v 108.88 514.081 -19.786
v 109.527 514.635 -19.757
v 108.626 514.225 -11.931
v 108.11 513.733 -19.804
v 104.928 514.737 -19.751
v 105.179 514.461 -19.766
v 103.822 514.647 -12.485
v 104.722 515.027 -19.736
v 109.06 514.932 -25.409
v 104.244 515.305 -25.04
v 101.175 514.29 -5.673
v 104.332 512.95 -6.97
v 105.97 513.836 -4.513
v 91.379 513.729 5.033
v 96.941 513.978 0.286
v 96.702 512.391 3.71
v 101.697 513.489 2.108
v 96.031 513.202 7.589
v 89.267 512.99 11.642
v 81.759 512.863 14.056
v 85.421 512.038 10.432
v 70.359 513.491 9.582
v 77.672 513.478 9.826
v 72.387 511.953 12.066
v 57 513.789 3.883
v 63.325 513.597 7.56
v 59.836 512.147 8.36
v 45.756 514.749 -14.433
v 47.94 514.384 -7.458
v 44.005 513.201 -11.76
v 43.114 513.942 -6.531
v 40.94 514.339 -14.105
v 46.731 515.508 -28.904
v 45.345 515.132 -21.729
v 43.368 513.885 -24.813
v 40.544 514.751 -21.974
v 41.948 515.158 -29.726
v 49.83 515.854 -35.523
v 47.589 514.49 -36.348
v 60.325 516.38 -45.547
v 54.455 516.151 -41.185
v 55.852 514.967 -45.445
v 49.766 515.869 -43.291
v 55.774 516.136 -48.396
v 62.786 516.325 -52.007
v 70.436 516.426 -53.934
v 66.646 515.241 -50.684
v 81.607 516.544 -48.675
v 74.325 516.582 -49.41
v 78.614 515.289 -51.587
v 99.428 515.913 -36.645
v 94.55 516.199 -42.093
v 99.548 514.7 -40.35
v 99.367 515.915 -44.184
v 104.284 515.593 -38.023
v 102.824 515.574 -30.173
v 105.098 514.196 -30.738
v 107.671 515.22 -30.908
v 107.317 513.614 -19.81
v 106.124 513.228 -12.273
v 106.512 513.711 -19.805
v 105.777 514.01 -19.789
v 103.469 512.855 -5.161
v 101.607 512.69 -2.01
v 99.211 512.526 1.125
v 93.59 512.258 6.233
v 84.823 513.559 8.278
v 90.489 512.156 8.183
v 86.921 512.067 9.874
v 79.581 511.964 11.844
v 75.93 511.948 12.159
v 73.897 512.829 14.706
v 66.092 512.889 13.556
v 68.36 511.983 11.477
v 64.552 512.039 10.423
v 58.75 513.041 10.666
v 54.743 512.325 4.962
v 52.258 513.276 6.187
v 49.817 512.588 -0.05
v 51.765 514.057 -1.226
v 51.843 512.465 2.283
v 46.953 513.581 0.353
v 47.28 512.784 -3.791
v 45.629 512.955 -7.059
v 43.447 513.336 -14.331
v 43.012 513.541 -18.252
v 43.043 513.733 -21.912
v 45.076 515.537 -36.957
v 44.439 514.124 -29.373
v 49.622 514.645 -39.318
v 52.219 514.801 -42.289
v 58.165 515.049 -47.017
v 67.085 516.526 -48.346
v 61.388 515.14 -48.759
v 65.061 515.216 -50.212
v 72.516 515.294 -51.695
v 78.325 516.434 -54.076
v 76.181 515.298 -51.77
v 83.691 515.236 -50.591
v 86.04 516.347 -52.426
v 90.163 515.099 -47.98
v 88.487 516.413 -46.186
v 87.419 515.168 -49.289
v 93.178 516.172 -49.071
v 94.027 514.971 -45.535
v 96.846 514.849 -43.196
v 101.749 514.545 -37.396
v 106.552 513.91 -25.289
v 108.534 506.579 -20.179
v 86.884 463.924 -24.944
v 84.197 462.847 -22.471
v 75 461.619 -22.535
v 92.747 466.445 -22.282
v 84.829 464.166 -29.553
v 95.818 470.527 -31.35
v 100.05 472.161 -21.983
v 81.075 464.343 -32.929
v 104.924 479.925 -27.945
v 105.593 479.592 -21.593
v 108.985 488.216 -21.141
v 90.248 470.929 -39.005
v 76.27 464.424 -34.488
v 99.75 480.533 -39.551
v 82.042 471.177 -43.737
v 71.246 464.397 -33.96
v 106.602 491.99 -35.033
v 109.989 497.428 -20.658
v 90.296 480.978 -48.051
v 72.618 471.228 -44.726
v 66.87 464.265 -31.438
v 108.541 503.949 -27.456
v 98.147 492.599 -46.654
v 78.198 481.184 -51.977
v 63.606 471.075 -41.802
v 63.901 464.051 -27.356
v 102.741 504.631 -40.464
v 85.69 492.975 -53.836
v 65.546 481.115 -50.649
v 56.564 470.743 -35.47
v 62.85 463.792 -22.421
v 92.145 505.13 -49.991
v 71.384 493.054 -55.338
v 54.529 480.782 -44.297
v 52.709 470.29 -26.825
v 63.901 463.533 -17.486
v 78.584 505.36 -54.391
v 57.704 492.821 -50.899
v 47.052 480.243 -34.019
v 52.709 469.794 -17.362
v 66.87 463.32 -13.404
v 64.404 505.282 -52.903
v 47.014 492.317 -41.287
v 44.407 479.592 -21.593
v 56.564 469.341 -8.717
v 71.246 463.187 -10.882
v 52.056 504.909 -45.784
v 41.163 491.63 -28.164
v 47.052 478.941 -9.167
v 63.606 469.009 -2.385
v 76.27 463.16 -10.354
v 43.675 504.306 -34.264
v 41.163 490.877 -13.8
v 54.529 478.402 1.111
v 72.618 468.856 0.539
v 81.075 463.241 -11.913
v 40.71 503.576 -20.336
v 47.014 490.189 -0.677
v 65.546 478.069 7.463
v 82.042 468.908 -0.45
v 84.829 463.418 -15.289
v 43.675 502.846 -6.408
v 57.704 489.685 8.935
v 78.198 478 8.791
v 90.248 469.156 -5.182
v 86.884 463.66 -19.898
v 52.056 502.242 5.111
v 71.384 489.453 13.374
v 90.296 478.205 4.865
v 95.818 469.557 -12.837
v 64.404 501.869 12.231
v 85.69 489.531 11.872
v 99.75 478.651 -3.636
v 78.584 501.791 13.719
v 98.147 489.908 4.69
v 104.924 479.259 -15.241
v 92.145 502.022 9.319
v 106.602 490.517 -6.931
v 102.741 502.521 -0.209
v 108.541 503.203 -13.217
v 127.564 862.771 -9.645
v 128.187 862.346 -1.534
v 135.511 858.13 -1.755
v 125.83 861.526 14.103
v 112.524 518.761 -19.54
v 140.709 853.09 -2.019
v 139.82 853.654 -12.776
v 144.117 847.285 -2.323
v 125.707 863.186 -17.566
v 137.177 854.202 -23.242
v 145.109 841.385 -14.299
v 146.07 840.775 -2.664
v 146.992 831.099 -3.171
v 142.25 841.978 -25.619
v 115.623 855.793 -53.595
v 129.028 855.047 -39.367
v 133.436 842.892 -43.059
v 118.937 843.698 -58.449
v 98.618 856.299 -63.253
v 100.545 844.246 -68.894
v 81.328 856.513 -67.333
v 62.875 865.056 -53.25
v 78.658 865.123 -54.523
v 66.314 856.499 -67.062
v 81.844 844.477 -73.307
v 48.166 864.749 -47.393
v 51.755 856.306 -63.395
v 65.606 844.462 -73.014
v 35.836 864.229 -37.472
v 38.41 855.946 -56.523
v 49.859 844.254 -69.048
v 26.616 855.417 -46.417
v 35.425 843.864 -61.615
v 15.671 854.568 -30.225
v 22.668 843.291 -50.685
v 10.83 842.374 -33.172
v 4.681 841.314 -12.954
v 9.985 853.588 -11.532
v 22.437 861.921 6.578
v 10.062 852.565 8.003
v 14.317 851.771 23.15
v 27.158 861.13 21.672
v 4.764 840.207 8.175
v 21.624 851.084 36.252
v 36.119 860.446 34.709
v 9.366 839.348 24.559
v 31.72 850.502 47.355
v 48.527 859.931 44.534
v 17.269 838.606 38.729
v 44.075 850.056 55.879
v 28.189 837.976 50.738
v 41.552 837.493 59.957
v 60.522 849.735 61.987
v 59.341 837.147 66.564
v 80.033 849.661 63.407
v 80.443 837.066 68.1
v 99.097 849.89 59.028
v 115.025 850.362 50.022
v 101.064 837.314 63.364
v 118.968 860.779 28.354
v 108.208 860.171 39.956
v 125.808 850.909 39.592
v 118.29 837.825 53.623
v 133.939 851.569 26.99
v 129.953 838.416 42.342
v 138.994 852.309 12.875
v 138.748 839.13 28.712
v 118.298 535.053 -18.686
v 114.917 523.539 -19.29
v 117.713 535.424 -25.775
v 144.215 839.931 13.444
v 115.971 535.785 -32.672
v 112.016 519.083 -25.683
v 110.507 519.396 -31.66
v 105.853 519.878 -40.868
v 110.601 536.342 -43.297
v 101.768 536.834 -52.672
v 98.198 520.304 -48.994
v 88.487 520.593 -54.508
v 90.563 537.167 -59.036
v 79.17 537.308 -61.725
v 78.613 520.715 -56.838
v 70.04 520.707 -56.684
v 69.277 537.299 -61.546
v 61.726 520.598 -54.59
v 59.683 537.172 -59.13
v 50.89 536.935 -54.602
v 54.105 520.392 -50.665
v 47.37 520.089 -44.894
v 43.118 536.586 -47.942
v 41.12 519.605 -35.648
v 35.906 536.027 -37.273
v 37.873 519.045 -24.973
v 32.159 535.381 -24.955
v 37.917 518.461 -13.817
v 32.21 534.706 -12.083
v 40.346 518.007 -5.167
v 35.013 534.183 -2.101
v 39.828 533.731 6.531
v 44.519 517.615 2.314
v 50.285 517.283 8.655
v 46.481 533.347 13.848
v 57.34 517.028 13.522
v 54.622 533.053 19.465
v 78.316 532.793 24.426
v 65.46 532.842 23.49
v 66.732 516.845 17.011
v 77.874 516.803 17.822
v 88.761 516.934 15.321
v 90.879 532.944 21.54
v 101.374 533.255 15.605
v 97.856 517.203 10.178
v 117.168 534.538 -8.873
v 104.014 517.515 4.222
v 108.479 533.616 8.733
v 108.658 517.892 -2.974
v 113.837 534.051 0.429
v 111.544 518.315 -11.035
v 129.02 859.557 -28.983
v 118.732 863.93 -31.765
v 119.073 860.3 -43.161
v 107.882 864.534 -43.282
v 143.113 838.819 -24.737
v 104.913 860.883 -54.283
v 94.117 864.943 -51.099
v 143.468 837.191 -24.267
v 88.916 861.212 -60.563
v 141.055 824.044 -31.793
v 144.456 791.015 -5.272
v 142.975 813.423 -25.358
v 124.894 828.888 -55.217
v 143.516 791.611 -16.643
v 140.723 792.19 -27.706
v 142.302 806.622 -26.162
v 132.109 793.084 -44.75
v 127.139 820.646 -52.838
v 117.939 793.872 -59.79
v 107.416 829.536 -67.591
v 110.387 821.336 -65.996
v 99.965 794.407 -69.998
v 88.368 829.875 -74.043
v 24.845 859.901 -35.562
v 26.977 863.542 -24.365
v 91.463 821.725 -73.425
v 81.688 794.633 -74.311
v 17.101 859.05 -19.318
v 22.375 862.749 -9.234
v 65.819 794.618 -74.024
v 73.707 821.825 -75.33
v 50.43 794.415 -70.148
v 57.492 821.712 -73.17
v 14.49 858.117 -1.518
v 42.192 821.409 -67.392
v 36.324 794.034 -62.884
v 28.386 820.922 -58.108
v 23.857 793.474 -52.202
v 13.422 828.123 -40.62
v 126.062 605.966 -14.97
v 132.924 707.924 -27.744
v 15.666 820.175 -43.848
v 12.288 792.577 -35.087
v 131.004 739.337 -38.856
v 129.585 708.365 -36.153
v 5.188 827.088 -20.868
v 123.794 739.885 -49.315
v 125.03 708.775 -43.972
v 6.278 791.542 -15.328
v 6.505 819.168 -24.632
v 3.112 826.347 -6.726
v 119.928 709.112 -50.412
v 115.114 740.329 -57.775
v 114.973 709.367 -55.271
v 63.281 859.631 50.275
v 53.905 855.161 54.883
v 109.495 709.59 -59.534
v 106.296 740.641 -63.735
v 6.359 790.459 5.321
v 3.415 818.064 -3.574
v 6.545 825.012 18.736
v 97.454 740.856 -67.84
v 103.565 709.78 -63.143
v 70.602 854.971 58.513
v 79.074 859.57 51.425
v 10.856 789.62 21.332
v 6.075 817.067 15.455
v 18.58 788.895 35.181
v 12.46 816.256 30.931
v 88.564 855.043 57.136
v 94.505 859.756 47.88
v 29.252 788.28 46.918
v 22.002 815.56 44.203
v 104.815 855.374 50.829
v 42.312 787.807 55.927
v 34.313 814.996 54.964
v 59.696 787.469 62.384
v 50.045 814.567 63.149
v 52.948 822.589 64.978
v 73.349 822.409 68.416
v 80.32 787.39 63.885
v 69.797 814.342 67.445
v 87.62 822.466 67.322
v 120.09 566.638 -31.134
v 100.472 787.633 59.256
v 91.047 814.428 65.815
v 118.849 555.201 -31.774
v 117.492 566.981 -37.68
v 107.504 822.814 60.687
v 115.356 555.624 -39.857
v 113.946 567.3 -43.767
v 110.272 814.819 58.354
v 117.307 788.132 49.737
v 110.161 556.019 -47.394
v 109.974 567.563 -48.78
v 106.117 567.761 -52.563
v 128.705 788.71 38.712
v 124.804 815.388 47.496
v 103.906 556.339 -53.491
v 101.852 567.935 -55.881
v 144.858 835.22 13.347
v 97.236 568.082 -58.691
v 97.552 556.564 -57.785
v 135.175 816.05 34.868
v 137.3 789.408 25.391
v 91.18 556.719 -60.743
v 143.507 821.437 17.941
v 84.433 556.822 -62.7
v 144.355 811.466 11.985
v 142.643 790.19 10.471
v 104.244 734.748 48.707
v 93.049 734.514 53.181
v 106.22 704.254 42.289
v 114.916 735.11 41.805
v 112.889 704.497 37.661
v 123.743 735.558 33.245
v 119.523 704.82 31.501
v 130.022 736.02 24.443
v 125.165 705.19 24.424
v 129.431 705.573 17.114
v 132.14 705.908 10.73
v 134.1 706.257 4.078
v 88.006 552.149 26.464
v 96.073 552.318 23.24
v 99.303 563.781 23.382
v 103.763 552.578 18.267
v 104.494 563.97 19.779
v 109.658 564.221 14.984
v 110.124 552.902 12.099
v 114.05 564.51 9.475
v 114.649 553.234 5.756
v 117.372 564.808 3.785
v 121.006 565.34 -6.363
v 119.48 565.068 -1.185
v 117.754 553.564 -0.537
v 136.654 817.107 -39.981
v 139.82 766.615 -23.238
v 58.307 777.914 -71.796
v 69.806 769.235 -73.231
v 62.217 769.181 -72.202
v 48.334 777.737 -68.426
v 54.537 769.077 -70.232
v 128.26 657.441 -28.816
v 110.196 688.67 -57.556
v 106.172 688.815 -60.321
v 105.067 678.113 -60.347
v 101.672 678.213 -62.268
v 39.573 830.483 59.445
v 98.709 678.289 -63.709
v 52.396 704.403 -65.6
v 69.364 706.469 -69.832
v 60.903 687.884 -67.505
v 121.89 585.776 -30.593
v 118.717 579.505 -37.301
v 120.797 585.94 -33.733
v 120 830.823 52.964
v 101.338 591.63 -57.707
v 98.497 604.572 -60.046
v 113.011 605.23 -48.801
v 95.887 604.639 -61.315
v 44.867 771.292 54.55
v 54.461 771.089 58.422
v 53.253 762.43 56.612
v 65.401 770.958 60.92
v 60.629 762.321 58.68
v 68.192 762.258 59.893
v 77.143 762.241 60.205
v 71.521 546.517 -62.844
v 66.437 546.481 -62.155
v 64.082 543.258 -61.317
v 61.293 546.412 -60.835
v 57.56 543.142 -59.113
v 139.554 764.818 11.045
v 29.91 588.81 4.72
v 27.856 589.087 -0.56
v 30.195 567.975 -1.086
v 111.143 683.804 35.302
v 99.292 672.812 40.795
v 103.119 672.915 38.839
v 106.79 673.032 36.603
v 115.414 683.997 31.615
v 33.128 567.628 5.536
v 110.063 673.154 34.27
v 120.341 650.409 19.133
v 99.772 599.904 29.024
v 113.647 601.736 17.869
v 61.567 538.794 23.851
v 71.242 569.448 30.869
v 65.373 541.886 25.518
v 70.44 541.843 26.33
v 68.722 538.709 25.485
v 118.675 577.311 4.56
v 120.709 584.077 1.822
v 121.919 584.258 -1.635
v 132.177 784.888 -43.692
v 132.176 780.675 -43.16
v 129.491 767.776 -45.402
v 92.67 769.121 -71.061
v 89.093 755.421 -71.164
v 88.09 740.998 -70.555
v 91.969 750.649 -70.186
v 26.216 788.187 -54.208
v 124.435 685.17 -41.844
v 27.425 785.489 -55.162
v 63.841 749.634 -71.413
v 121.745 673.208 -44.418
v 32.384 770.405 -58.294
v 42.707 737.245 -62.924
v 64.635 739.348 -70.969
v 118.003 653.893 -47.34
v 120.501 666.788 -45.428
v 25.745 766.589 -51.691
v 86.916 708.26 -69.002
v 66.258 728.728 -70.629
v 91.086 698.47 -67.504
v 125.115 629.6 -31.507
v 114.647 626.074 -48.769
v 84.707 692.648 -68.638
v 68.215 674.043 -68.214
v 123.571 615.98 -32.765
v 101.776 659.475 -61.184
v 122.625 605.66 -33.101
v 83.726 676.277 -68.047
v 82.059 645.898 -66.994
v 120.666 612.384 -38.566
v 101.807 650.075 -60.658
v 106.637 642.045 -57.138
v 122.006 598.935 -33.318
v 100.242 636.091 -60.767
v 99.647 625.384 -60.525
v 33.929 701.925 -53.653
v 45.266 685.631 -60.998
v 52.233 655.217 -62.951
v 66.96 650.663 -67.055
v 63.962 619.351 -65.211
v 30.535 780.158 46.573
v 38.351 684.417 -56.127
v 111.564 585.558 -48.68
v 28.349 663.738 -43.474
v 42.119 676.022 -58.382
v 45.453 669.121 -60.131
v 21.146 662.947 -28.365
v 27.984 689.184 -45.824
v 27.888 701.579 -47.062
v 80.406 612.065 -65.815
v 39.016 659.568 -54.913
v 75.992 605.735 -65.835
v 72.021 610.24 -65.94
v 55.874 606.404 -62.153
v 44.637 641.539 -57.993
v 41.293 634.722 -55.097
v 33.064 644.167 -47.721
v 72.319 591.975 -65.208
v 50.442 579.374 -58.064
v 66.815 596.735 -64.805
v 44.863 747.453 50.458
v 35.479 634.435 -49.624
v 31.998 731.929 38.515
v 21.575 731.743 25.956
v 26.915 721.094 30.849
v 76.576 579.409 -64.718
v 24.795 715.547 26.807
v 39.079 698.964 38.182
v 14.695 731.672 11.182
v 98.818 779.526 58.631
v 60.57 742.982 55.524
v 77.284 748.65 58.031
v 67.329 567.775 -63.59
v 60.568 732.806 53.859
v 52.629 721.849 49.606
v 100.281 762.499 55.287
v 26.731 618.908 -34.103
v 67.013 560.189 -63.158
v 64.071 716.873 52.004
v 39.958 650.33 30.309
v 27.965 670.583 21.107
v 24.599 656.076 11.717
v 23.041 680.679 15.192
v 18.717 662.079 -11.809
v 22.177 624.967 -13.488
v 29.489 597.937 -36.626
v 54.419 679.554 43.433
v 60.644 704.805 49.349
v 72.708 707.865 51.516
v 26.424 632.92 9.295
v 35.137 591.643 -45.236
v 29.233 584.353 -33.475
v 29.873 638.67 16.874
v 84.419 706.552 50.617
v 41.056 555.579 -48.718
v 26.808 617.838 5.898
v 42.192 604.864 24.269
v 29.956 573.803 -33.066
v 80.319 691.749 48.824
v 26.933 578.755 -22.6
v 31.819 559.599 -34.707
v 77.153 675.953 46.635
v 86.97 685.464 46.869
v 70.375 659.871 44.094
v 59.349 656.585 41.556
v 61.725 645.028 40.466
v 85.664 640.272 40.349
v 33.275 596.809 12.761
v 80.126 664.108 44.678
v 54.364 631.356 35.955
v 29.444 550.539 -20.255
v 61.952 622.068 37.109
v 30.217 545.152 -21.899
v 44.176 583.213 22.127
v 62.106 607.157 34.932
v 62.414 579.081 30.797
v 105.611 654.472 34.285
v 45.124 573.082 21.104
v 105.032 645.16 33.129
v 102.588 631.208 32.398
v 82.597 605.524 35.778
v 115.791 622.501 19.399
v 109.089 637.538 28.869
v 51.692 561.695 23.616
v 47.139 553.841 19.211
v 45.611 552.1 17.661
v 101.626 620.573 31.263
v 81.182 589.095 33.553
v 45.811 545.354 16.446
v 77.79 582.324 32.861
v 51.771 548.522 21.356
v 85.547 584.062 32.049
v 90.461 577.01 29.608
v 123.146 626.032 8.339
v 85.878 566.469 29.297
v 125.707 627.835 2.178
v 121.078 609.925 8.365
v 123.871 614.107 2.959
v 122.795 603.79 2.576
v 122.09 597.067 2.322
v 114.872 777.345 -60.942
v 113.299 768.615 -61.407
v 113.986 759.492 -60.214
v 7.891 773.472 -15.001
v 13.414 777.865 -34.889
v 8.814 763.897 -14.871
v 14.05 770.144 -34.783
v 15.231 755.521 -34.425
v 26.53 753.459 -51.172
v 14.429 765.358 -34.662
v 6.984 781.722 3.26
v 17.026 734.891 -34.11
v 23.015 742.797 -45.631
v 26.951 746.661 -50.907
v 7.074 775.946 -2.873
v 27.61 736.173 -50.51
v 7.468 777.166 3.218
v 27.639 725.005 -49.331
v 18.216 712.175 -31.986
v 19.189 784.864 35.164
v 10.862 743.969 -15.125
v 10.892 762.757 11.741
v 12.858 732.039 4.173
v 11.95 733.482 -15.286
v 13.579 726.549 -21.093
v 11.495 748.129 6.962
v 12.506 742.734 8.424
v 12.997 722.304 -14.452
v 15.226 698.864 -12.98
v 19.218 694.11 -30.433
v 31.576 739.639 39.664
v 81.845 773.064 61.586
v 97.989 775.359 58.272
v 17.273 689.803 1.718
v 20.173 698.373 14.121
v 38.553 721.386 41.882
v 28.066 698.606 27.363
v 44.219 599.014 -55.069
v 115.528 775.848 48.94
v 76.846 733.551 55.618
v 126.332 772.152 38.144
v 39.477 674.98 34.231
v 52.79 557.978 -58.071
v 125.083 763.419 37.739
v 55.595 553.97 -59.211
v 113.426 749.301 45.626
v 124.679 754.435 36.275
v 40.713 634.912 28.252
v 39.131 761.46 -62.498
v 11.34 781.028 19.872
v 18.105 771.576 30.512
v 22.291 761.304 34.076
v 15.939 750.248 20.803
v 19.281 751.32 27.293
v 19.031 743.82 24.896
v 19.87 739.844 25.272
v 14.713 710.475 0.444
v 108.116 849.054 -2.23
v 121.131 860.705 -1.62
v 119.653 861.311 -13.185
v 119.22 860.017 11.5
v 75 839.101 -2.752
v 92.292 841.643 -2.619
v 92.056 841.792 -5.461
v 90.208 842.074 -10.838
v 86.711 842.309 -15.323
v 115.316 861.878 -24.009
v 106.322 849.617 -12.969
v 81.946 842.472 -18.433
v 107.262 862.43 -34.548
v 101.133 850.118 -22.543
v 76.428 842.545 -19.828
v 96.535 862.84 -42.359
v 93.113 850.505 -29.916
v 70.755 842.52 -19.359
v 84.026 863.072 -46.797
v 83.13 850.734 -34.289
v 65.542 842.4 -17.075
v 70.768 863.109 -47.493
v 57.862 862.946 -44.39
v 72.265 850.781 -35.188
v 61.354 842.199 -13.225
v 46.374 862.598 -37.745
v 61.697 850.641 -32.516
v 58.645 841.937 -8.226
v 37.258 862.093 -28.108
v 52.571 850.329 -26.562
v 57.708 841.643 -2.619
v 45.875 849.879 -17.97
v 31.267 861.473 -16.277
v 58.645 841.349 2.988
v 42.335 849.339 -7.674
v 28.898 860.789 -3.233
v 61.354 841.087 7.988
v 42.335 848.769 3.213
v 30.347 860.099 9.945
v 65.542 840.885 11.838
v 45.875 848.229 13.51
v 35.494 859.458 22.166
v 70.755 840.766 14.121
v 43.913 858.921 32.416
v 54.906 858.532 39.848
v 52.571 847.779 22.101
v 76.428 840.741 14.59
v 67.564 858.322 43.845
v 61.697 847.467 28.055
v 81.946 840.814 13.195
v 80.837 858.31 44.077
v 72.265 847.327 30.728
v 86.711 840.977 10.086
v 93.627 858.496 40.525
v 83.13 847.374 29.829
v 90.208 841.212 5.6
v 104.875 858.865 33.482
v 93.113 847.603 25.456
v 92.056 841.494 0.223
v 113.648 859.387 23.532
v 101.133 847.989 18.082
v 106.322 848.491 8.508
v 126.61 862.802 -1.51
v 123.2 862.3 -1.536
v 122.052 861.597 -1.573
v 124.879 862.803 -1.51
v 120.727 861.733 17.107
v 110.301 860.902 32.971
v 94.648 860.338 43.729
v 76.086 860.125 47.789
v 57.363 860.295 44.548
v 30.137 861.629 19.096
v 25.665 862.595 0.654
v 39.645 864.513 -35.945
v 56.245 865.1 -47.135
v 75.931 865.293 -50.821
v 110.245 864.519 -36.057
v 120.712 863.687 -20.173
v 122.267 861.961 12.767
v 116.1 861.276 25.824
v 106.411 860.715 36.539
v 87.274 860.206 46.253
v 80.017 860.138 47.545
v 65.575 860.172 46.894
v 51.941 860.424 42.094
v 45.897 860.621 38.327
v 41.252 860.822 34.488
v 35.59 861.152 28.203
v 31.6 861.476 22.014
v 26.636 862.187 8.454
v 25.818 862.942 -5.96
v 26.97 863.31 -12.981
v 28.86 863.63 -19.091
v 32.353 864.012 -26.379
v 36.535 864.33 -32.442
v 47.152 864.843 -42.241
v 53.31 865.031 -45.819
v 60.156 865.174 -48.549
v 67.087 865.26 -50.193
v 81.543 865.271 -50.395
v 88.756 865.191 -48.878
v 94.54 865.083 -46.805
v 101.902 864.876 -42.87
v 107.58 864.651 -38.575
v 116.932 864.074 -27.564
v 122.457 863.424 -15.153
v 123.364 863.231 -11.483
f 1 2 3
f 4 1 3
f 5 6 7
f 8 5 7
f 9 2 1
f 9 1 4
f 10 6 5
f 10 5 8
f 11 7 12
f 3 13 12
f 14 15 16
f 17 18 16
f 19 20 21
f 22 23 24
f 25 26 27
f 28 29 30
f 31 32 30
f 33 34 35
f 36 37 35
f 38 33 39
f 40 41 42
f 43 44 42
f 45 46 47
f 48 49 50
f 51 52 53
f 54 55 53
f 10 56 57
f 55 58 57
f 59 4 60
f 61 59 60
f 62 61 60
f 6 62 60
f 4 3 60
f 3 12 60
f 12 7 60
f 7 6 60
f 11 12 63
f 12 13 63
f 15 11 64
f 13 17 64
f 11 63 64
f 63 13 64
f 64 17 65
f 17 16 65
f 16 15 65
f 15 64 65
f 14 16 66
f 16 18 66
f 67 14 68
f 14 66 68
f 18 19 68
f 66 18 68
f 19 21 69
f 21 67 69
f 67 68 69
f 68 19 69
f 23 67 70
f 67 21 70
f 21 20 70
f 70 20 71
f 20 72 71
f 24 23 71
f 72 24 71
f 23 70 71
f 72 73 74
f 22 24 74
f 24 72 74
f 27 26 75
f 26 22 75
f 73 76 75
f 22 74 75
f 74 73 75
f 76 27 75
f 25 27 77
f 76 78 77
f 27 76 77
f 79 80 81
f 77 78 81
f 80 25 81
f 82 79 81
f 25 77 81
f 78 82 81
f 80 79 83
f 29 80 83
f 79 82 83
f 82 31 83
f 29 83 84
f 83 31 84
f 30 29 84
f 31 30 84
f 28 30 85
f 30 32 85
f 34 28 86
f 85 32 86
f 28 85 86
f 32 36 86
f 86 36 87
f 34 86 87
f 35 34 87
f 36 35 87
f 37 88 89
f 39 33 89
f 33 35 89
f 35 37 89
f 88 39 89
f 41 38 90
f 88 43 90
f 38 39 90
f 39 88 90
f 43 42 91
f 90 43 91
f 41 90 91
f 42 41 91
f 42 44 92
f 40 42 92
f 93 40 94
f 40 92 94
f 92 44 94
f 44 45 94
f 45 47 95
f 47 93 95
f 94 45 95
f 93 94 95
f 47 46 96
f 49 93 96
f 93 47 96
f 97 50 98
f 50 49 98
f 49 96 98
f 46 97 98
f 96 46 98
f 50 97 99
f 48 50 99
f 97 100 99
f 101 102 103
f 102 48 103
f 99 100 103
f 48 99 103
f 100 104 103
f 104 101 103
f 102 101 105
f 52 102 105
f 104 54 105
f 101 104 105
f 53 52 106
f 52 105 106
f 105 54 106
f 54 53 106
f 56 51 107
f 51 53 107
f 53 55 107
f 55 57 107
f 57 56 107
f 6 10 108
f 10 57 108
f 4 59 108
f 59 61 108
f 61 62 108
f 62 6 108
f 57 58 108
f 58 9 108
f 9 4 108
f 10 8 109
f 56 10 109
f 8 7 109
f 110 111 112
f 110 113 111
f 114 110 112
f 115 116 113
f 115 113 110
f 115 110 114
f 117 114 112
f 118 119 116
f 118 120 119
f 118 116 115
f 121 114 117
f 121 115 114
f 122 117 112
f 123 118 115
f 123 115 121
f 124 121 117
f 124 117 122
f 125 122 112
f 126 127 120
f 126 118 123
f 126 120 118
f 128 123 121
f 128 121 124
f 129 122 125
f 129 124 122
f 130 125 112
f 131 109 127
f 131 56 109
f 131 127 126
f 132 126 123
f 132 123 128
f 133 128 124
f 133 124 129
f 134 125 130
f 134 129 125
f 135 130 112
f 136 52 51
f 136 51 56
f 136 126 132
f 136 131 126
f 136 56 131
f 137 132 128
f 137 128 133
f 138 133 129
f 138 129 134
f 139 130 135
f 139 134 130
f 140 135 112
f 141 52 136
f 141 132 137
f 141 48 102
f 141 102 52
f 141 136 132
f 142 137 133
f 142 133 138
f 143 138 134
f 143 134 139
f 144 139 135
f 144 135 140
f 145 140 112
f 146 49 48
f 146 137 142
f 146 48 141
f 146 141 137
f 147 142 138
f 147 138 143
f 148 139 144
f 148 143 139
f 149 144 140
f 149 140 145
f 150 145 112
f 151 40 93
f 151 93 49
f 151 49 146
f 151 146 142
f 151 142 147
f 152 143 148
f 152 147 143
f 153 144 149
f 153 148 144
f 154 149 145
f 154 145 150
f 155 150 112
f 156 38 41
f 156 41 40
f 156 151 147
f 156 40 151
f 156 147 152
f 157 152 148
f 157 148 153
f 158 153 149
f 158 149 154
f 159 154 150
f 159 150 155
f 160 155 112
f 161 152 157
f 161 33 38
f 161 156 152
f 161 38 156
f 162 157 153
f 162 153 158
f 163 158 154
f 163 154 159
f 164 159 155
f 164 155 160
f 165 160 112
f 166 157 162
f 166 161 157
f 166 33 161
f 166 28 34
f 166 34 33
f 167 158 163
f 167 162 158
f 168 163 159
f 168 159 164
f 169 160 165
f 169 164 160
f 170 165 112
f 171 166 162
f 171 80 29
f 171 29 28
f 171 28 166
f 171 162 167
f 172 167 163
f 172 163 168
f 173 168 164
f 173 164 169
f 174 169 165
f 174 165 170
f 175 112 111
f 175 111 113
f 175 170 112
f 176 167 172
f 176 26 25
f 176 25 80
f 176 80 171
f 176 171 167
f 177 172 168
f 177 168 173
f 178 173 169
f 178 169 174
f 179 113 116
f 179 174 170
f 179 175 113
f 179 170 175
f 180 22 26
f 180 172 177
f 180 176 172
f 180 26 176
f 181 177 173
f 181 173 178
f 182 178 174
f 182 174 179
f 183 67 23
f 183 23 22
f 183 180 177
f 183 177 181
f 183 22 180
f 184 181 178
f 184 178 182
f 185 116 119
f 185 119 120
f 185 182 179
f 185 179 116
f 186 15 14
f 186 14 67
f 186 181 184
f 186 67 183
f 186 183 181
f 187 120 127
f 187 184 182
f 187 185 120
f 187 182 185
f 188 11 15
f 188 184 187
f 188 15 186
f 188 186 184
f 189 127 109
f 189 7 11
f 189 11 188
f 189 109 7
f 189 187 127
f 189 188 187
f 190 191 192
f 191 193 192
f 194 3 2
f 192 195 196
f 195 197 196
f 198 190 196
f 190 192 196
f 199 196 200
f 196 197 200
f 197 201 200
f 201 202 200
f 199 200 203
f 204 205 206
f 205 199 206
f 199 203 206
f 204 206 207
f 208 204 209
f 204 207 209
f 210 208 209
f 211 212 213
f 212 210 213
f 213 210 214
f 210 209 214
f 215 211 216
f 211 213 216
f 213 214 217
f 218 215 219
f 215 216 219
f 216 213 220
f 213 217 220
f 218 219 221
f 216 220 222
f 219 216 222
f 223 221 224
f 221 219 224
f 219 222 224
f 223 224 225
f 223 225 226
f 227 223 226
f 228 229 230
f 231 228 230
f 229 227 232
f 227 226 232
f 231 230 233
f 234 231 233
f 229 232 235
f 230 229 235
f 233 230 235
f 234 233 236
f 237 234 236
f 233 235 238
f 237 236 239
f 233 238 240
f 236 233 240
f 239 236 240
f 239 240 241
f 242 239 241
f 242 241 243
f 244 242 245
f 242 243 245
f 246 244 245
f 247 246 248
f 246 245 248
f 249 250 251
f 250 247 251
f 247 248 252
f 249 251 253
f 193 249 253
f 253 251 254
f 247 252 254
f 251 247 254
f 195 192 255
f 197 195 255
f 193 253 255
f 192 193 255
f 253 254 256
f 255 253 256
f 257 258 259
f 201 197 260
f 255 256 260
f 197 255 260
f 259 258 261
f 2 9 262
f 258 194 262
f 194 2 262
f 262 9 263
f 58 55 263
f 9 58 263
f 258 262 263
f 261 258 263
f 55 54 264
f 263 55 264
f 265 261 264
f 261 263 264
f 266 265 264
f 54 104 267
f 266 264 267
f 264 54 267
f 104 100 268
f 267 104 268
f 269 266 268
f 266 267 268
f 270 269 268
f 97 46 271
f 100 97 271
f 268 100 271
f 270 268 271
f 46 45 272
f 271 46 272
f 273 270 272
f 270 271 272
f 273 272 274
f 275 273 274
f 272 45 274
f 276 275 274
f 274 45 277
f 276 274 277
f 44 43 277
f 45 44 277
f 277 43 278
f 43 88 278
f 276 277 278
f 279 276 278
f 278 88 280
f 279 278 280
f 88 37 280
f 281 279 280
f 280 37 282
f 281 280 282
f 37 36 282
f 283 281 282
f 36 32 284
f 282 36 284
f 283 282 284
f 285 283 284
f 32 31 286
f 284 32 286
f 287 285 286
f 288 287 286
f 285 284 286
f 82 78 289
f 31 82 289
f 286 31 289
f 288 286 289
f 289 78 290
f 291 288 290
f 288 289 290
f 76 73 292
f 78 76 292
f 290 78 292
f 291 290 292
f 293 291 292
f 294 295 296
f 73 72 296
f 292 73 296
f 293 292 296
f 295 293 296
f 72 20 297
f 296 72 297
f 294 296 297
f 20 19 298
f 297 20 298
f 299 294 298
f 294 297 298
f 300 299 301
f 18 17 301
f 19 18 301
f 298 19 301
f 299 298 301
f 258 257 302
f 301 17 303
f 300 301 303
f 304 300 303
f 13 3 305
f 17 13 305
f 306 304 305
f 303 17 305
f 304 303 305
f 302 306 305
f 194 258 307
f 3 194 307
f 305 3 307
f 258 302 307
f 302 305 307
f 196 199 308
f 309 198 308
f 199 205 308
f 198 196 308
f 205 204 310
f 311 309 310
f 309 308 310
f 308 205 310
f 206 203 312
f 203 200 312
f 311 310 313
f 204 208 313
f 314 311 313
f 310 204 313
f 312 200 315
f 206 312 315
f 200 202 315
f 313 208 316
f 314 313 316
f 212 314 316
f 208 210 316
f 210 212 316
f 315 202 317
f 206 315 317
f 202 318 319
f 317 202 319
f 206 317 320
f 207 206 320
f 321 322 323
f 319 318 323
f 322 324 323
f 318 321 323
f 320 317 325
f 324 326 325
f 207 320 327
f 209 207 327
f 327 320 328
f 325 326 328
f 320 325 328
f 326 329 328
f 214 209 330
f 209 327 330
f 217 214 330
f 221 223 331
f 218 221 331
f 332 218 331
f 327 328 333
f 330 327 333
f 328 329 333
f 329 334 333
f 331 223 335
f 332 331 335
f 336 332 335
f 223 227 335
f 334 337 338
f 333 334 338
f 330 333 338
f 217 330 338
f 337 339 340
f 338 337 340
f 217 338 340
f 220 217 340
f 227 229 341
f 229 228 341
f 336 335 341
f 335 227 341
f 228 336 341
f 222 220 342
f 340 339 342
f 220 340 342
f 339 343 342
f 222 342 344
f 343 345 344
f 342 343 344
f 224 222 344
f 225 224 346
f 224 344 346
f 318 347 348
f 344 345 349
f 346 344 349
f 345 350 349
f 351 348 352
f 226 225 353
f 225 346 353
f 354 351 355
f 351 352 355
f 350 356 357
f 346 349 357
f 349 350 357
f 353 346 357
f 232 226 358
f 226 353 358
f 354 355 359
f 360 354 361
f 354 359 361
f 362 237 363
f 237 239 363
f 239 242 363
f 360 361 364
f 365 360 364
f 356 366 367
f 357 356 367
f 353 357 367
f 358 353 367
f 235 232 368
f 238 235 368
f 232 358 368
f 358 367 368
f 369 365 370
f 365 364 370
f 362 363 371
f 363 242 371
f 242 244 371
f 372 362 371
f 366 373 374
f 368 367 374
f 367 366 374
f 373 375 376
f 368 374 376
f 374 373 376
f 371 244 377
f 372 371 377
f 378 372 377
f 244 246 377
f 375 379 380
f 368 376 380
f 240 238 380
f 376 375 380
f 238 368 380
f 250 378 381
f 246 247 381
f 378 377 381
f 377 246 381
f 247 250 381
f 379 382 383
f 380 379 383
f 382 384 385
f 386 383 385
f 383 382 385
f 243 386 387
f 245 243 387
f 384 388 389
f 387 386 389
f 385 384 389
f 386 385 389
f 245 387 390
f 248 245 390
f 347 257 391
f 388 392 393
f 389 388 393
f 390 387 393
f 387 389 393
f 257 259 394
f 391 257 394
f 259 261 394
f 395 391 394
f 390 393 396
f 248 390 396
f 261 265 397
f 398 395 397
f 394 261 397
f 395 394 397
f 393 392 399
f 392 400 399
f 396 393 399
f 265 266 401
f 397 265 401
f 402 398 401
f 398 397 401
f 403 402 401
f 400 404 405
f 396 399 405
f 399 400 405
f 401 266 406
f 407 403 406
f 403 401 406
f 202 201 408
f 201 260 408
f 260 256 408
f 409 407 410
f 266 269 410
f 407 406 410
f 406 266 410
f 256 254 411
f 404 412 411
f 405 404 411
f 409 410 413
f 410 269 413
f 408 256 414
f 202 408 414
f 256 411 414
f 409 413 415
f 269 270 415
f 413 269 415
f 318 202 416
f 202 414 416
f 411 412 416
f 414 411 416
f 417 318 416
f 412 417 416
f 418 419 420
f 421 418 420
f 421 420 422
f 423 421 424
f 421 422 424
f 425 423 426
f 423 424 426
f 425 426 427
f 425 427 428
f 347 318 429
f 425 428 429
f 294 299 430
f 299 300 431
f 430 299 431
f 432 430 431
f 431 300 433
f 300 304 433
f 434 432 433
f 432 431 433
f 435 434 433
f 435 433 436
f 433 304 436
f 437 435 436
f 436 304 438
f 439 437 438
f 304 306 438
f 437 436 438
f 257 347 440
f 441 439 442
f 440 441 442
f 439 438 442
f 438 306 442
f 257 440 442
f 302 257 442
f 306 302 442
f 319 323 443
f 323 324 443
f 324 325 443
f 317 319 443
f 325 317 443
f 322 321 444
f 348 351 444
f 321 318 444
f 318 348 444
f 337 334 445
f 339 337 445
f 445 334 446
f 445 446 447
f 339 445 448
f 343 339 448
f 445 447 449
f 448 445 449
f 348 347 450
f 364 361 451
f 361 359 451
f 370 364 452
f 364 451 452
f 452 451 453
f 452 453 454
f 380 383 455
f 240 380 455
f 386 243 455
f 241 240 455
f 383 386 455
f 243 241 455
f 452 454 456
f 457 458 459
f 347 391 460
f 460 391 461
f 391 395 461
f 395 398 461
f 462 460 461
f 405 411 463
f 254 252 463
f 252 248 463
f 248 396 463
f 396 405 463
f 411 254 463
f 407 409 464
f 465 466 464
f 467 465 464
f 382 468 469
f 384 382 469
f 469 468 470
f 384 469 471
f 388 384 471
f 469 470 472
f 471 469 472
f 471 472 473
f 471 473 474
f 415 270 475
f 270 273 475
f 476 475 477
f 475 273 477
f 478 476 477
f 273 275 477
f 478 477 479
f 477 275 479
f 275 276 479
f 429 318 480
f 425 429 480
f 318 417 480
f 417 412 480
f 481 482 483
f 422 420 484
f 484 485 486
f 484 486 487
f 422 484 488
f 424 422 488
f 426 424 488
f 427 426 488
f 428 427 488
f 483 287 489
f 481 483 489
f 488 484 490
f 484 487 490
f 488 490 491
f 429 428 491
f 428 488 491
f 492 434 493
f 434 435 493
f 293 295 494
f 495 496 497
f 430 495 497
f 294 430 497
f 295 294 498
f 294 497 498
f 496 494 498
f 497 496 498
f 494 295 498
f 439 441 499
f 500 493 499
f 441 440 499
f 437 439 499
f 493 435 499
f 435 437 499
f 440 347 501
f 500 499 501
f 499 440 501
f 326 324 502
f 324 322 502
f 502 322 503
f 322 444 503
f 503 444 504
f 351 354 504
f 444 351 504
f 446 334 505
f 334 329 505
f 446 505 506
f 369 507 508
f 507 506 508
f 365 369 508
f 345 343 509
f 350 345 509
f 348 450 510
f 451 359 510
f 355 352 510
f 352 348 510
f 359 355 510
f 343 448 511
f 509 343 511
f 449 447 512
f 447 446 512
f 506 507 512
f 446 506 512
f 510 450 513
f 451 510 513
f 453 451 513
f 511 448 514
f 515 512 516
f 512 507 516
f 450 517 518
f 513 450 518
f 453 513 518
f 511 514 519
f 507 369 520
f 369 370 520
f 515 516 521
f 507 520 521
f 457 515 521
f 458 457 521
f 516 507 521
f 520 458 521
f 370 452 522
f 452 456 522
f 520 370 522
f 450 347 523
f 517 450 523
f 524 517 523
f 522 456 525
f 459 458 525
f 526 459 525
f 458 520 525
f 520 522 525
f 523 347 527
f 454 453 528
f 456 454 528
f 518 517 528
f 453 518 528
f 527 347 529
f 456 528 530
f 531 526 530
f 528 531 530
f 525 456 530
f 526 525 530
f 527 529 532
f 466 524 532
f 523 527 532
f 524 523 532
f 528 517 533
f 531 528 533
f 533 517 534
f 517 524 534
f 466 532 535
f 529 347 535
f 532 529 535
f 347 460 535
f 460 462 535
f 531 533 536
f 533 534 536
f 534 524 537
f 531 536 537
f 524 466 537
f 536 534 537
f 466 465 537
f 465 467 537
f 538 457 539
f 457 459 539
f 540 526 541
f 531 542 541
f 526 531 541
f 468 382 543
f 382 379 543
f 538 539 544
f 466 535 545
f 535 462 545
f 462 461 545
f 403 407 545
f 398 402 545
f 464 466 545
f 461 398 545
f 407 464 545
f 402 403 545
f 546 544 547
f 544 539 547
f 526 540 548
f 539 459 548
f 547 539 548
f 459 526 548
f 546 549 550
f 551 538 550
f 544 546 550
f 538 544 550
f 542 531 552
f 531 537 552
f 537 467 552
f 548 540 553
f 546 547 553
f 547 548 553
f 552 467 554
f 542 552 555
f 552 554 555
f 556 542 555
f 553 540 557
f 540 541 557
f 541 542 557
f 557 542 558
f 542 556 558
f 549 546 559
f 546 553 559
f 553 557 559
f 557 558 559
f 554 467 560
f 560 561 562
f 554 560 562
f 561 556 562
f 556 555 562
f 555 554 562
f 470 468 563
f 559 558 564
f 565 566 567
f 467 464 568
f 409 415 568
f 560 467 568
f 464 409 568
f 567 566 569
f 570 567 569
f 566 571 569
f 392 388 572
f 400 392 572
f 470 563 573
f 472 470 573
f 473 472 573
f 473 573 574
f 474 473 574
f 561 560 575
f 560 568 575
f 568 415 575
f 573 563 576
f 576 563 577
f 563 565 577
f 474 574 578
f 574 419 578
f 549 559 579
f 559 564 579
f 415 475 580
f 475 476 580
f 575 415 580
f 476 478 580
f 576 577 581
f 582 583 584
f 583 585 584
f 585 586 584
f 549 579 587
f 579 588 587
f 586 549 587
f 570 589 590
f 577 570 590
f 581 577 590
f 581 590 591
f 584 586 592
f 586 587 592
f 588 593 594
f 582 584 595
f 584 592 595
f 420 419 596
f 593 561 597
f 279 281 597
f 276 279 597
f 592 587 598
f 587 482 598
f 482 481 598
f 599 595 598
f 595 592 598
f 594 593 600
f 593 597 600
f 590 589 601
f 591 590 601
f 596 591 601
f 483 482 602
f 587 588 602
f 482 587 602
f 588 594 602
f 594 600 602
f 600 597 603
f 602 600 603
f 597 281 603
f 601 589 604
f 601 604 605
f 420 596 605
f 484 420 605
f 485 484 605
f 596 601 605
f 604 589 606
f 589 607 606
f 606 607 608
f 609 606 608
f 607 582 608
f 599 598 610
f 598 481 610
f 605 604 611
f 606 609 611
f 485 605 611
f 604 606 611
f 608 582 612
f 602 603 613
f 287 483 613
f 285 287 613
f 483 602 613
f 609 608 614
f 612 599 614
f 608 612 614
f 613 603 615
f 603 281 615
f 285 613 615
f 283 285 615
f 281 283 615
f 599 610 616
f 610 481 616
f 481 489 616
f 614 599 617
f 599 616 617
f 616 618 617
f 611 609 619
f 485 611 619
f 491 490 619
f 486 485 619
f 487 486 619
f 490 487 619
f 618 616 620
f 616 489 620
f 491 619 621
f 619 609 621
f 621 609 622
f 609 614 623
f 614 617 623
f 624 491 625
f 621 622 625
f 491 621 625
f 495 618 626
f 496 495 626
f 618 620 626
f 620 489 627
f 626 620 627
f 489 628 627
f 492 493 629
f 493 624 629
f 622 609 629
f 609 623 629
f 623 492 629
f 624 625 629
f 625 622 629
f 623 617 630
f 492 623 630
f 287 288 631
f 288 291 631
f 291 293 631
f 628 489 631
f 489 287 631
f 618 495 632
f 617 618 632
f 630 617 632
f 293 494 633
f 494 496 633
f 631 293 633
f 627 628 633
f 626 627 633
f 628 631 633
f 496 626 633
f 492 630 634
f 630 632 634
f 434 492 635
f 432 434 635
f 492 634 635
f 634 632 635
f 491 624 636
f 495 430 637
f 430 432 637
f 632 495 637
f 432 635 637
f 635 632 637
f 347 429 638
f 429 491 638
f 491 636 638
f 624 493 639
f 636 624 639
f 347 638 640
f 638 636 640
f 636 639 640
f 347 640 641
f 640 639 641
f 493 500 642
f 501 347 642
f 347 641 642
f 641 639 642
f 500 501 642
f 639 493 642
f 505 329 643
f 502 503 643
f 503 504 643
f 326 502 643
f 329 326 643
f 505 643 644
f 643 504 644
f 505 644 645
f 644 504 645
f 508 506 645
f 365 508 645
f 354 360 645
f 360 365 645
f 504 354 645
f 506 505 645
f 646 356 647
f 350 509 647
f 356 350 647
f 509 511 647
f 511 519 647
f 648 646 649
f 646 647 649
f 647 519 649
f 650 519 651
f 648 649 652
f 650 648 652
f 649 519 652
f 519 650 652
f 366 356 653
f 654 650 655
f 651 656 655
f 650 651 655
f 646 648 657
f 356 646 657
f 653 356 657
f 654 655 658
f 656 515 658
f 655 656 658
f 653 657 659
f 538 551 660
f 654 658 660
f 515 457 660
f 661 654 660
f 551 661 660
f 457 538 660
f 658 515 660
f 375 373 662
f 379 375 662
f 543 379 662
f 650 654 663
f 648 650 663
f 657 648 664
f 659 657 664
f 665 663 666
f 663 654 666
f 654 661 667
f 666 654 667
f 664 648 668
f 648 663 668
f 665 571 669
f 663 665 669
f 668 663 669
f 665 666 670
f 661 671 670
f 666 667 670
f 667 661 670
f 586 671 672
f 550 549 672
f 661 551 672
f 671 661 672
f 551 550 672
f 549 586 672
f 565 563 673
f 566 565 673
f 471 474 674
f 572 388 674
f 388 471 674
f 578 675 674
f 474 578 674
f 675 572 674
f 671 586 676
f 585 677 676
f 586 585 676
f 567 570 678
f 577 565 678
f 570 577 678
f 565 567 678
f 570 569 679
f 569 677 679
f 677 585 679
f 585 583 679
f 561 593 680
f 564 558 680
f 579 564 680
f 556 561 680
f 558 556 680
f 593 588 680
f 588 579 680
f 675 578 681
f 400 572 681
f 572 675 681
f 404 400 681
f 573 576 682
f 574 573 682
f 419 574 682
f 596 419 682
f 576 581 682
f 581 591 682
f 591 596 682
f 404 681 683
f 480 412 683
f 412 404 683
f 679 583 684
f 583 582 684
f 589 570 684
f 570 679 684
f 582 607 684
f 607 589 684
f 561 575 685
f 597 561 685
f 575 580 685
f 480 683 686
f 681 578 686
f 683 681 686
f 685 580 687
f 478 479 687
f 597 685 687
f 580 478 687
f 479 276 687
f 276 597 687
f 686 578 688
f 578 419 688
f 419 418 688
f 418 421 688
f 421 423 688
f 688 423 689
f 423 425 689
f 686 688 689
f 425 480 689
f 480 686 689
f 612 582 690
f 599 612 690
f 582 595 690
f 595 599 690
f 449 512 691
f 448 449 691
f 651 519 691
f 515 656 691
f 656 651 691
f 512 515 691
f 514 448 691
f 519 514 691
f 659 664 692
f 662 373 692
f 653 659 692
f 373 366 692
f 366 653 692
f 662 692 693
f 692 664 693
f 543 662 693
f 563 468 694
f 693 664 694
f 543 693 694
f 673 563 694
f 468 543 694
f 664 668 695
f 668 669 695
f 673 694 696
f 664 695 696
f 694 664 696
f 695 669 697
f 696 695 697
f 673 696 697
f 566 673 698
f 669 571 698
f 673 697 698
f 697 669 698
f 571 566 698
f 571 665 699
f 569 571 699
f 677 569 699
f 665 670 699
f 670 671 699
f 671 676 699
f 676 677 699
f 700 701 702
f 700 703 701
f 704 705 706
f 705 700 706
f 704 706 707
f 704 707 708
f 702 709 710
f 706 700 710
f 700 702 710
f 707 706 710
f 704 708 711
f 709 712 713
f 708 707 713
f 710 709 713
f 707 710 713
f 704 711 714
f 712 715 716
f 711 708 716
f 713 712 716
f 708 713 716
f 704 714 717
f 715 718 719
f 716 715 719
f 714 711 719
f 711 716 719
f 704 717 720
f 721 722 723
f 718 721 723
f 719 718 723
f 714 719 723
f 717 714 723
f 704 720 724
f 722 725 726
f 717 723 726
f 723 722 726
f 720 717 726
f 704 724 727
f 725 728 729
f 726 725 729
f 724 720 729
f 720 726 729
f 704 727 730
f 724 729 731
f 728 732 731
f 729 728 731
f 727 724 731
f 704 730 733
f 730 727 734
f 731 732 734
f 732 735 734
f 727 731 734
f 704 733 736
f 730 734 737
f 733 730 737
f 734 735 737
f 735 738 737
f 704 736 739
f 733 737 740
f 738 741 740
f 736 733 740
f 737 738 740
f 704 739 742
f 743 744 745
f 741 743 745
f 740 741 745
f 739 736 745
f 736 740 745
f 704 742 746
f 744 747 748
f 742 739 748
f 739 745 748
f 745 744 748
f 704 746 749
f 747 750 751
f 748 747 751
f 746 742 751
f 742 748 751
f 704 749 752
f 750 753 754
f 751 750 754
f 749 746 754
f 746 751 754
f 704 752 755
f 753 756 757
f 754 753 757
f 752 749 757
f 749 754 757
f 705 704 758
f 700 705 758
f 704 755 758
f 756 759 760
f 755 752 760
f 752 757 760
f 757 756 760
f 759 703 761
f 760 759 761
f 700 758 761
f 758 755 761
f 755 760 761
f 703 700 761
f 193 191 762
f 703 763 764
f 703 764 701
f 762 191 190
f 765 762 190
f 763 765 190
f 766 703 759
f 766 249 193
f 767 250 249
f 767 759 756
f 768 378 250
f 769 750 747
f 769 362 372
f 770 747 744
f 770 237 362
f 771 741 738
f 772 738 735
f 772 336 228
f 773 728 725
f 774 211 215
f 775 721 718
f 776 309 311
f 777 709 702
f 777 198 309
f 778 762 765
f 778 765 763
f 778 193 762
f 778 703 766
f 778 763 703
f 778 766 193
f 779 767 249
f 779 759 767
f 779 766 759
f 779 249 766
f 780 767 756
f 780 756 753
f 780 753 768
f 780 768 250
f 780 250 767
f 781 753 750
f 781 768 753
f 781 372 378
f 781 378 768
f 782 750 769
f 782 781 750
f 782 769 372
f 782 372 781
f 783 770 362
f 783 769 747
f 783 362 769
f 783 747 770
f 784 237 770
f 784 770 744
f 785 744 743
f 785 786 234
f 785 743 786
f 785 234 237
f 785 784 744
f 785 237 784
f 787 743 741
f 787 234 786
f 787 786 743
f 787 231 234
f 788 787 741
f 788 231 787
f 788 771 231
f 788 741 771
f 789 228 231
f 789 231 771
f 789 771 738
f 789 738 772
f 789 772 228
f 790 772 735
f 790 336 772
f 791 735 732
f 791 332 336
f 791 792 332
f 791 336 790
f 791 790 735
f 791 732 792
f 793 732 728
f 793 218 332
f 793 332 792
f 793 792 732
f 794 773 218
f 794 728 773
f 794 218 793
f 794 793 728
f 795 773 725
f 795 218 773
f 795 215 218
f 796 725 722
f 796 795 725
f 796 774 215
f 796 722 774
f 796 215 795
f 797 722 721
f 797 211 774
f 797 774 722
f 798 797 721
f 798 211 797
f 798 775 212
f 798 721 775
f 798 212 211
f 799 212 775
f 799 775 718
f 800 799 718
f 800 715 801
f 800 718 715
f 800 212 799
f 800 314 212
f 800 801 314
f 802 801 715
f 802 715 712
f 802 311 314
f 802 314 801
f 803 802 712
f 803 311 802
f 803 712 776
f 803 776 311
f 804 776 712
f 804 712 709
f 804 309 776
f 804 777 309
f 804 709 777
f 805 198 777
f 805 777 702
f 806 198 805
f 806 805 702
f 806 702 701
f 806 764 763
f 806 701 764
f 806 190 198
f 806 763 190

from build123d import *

# Parameters (mm, degrees)
FILLET096_R             = 6
FILLET097_R             = 3
BODY058_PLACEMENT_ANGLE = 3


with BuildPart() as part:
    # Sketch195 → Revolution100 (revolve)
    with BuildSketch(Plane.XY):
        with BuildLine():
            Line((0, -29.245996), (0, -395.969613))
            add(Edge.make_bspline(
                [(0, -29.245996), (71.97521, -29.245996), (74.761139, -71.14093), (60.18763, -188.319479), (45.659971, -358.12794), (39.993144, -395.969613), (0, -395.969613)],
                knots=[0, 0, 0, 0, 0.25, 0.5, 0.75, 1, 1, 1, 1], degree=3))
        make_face()
    revolve(axis=Axis((0, 0, 0), (0, 1, 0)))

    # Sketch196 → Groove094 (revolve, cut)
    with BuildSketch(Plane.XY):
        with BuildLine():
            Line((0, 60), (0, -60))
            ThreePointArc((0, -60), (60, 0), (0, 60))
        make_face()
    revolve(axis=Axis((0, 0, 0), (0, 1, 0)), mode=Mode.SUBTRACT)

    # Fillet096
    fillet096_edges = [part.edges().sort_by_distance(p)[0] for p in [
        (-48.746872, -34.982031, 0),
    ]]
    fillet(fillet096_edges, radius=FILLET096_R)

    # Sketch197 → Groove095 (revolve, cut)
    with BuildSketch(Plane.XY):
        with BuildLine():
            Line((0, -368), (0, -438))
            ThreePointArc((0, -438), (35, -403), (0, -368))
        make_face()
    revolve(axis=Axis((0, 0, 0), (0, 1, 0)), mode=Mode.SUBTRACT)

    # Fillet097
    fillet097_edges = [part.edges().sort_by_distance(p)[0] for p in [
        (-31.536984, -387.820454, 0),
    ]]
    fillet(fillet097_edges, radius=FILLET097_R)

    # Sketch197 → Revolution101 (revolve)
    with BuildSketch(Plane.XY):
        with BuildLine():
            Line((0, -368), (0, -438))
            ThreePointArc((0, -438), (35, -403), (0, -368))
        make_face()
    revolve(axis=Axis((0, 0, 0), (0, 1, 0)))


with BuildPart() as part_1:
    # Body058 placement: moved
    add(part.part.moved(Location((75, 899.018312, 0.388141))).rotate(Axis((75, 899.018312, 0.388141), (1, 0, 0)), BODY058_PLACEMENT_ANGLE))


solid = part_1.part
